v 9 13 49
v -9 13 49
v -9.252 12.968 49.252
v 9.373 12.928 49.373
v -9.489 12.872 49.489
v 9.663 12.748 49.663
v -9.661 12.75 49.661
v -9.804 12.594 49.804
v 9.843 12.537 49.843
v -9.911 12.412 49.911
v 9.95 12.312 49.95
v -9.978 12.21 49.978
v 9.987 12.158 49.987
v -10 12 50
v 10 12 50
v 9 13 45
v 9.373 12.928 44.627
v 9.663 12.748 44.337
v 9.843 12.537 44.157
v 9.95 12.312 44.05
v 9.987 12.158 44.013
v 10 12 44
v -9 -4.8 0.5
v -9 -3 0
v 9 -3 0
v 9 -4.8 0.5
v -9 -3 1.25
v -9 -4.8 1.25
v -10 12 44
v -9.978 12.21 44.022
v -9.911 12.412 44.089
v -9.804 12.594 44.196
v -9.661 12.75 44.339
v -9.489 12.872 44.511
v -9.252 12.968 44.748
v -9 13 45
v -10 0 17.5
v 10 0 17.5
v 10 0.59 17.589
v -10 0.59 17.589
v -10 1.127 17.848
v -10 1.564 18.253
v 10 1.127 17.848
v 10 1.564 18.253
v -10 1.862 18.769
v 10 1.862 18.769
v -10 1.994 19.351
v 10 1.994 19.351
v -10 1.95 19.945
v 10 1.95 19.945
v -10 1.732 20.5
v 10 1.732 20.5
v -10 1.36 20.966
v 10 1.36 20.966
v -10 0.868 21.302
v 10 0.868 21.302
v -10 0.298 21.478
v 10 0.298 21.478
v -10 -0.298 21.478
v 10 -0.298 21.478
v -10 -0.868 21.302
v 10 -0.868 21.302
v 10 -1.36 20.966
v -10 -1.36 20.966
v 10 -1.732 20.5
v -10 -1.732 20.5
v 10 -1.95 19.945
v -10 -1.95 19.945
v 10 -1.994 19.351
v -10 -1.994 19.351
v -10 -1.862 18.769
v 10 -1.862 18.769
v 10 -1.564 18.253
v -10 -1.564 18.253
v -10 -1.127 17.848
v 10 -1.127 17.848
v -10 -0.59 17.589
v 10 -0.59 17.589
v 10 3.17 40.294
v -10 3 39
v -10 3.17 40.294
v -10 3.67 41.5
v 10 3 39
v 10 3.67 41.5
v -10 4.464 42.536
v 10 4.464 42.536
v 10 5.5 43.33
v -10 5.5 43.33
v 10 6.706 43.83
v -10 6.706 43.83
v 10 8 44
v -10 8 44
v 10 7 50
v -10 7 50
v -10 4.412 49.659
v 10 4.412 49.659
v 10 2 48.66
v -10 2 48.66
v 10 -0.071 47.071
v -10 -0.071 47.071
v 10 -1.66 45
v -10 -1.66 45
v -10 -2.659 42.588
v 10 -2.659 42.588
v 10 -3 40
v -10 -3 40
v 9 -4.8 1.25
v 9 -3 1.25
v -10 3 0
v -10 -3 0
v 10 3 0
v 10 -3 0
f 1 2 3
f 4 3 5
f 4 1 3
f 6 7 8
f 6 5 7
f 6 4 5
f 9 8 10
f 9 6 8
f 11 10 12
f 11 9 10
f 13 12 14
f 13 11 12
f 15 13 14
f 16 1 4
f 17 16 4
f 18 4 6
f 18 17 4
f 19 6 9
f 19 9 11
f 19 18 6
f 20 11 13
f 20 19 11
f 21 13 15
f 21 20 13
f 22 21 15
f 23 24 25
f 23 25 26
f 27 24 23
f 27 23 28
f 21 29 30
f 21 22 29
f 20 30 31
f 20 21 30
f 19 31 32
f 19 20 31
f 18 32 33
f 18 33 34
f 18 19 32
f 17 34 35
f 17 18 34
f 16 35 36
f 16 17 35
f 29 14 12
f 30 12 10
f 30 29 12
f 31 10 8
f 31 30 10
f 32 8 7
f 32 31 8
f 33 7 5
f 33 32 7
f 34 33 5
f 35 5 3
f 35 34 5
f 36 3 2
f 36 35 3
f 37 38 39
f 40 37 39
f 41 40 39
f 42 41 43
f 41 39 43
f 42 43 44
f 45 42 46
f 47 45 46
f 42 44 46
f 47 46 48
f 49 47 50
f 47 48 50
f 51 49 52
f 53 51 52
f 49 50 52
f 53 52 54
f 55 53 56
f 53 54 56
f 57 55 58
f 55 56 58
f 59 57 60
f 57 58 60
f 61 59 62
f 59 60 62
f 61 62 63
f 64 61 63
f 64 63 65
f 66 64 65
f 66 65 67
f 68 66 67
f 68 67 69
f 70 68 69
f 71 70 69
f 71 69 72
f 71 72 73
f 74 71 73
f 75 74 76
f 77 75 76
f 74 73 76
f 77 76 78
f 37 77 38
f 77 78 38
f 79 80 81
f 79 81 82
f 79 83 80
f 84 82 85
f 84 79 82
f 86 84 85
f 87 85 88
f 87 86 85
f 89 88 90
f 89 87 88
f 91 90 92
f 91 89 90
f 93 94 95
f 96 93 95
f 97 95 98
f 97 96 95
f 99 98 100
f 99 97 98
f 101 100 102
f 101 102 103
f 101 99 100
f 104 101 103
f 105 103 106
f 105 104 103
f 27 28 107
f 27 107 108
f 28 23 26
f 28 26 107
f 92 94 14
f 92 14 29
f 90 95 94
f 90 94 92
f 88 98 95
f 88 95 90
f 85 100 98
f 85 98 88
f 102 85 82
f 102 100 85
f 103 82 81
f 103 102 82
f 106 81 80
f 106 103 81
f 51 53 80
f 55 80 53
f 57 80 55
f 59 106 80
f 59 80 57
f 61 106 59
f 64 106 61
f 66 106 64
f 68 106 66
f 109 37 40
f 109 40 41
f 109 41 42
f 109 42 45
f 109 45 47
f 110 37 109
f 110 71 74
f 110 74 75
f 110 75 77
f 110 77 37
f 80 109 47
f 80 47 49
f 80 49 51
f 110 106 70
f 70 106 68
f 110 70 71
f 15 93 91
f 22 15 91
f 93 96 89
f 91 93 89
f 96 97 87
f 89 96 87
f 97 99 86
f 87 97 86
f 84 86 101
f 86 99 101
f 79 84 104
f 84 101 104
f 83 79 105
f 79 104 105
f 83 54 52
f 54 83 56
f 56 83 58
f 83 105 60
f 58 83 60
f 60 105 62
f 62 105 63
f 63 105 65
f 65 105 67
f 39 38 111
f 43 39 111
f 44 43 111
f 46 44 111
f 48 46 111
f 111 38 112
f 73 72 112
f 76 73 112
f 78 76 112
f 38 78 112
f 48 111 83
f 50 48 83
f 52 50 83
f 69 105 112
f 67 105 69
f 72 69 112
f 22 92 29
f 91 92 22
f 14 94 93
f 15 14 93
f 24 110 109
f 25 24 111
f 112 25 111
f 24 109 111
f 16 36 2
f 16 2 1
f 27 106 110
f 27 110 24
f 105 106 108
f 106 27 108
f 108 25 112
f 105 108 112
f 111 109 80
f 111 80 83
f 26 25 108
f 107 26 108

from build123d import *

# Parameters (mm, degrees)
SKETCH2_W                = 20
SKETCH2_H                = 6
BOSS_EXTRUDE1_DEPTH      = 50
BOSS_EXTRUDE3_DEPTH      = 9
BOSS_EXTRUDE3_DEPTH_BACK = 9
SKETCH6_R                = 2
CUT_EXTRUDE1_DEPTH       = 20
SKETCH7_W                = 20
SKETCH7_H                = 6
BOSS_EXTRUDE4_DEPTH      = 10
FILLET1_R                = 10
FILLET2_R                = 5
FILLET3_R                = 1


with BuildPart() as part:
    # Sketch2 → Boss-Extrude1 (new body)
    with BuildSketch(Plane.XY):
        Rectangle(SKETCH2_W, SKETCH2_H)
    extrude(amount=BOSS_EXTRUDE1_DEPTH)

    # Sketch5 → Boss-Extrude3 (add, two sides: drawn at the far end of the back side and taken through both)
    with BuildSketch(Plane(origin=(0, 0, 0), x_dir=(0, 0, -1), z_dir=(1, 0, 0)).offset(-BOSS_EXTRUDE3_DEPTH_BACK)):
        Polygon((0, -3), (-0.5, -4.8), (-1.25, -4.8), (-1.25, -3), align=None)
    extrude(amount=BOSS_EXTRUDE3_DEPTH + BOSS_EXTRUDE3_DEPTH_BACK)

    # Sketch6 → Cut-Extrude1 (cut)
    with BuildSketch(Plane(origin=(10, 0, 0), x_dir=(0, 0, -1), z_dir=(1, 0, 0))):
        with Locations((-19.5, 0)):
            Circle(SKETCH6_R)
    extrude(amount=-CUT_EXTRUDE1_DEPTH, mode=Mode.SUBTRACT)

    # Sketch7 → Boss-Extrude4 (add)
    with BuildSketch(Plane(origin=(0, 3, 0), x_dir=(1, 0, 0), z_dir=(0, 1, 0))):
        with Locations((0, -47)):
            Rectangle(SKETCH7_W, SKETCH7_H)
    extrude(amount=BOSS_EXTRUDE4_DEPTH)

    # Fillet1
    fillet1_edges = [part.edges().sort_by_distance(p)[0] for p in [
        (0, -3, 50),
    ]]
    fillet(fillet1_edges, radius=FILLET1_R)

    # Fillet2
    fillet2_edges = [part.edges().sort_by_distance(p)[0] for p in [
        (0, 3, 44),
    ]]
    fillet(fillet2_edges, radius=FILLET2_R)

    # Fillet3
    fillet3_edges = [part.edges().sort_by_distance(p)[0] for p in [
        (-10, 13, 47),
        (0, 13, 50),
        (10, 13, 47),
        (0, 13, 44),
    ]]
    fillet(fillet3_edges, radius=FILLET3_R)


solid = part.part
